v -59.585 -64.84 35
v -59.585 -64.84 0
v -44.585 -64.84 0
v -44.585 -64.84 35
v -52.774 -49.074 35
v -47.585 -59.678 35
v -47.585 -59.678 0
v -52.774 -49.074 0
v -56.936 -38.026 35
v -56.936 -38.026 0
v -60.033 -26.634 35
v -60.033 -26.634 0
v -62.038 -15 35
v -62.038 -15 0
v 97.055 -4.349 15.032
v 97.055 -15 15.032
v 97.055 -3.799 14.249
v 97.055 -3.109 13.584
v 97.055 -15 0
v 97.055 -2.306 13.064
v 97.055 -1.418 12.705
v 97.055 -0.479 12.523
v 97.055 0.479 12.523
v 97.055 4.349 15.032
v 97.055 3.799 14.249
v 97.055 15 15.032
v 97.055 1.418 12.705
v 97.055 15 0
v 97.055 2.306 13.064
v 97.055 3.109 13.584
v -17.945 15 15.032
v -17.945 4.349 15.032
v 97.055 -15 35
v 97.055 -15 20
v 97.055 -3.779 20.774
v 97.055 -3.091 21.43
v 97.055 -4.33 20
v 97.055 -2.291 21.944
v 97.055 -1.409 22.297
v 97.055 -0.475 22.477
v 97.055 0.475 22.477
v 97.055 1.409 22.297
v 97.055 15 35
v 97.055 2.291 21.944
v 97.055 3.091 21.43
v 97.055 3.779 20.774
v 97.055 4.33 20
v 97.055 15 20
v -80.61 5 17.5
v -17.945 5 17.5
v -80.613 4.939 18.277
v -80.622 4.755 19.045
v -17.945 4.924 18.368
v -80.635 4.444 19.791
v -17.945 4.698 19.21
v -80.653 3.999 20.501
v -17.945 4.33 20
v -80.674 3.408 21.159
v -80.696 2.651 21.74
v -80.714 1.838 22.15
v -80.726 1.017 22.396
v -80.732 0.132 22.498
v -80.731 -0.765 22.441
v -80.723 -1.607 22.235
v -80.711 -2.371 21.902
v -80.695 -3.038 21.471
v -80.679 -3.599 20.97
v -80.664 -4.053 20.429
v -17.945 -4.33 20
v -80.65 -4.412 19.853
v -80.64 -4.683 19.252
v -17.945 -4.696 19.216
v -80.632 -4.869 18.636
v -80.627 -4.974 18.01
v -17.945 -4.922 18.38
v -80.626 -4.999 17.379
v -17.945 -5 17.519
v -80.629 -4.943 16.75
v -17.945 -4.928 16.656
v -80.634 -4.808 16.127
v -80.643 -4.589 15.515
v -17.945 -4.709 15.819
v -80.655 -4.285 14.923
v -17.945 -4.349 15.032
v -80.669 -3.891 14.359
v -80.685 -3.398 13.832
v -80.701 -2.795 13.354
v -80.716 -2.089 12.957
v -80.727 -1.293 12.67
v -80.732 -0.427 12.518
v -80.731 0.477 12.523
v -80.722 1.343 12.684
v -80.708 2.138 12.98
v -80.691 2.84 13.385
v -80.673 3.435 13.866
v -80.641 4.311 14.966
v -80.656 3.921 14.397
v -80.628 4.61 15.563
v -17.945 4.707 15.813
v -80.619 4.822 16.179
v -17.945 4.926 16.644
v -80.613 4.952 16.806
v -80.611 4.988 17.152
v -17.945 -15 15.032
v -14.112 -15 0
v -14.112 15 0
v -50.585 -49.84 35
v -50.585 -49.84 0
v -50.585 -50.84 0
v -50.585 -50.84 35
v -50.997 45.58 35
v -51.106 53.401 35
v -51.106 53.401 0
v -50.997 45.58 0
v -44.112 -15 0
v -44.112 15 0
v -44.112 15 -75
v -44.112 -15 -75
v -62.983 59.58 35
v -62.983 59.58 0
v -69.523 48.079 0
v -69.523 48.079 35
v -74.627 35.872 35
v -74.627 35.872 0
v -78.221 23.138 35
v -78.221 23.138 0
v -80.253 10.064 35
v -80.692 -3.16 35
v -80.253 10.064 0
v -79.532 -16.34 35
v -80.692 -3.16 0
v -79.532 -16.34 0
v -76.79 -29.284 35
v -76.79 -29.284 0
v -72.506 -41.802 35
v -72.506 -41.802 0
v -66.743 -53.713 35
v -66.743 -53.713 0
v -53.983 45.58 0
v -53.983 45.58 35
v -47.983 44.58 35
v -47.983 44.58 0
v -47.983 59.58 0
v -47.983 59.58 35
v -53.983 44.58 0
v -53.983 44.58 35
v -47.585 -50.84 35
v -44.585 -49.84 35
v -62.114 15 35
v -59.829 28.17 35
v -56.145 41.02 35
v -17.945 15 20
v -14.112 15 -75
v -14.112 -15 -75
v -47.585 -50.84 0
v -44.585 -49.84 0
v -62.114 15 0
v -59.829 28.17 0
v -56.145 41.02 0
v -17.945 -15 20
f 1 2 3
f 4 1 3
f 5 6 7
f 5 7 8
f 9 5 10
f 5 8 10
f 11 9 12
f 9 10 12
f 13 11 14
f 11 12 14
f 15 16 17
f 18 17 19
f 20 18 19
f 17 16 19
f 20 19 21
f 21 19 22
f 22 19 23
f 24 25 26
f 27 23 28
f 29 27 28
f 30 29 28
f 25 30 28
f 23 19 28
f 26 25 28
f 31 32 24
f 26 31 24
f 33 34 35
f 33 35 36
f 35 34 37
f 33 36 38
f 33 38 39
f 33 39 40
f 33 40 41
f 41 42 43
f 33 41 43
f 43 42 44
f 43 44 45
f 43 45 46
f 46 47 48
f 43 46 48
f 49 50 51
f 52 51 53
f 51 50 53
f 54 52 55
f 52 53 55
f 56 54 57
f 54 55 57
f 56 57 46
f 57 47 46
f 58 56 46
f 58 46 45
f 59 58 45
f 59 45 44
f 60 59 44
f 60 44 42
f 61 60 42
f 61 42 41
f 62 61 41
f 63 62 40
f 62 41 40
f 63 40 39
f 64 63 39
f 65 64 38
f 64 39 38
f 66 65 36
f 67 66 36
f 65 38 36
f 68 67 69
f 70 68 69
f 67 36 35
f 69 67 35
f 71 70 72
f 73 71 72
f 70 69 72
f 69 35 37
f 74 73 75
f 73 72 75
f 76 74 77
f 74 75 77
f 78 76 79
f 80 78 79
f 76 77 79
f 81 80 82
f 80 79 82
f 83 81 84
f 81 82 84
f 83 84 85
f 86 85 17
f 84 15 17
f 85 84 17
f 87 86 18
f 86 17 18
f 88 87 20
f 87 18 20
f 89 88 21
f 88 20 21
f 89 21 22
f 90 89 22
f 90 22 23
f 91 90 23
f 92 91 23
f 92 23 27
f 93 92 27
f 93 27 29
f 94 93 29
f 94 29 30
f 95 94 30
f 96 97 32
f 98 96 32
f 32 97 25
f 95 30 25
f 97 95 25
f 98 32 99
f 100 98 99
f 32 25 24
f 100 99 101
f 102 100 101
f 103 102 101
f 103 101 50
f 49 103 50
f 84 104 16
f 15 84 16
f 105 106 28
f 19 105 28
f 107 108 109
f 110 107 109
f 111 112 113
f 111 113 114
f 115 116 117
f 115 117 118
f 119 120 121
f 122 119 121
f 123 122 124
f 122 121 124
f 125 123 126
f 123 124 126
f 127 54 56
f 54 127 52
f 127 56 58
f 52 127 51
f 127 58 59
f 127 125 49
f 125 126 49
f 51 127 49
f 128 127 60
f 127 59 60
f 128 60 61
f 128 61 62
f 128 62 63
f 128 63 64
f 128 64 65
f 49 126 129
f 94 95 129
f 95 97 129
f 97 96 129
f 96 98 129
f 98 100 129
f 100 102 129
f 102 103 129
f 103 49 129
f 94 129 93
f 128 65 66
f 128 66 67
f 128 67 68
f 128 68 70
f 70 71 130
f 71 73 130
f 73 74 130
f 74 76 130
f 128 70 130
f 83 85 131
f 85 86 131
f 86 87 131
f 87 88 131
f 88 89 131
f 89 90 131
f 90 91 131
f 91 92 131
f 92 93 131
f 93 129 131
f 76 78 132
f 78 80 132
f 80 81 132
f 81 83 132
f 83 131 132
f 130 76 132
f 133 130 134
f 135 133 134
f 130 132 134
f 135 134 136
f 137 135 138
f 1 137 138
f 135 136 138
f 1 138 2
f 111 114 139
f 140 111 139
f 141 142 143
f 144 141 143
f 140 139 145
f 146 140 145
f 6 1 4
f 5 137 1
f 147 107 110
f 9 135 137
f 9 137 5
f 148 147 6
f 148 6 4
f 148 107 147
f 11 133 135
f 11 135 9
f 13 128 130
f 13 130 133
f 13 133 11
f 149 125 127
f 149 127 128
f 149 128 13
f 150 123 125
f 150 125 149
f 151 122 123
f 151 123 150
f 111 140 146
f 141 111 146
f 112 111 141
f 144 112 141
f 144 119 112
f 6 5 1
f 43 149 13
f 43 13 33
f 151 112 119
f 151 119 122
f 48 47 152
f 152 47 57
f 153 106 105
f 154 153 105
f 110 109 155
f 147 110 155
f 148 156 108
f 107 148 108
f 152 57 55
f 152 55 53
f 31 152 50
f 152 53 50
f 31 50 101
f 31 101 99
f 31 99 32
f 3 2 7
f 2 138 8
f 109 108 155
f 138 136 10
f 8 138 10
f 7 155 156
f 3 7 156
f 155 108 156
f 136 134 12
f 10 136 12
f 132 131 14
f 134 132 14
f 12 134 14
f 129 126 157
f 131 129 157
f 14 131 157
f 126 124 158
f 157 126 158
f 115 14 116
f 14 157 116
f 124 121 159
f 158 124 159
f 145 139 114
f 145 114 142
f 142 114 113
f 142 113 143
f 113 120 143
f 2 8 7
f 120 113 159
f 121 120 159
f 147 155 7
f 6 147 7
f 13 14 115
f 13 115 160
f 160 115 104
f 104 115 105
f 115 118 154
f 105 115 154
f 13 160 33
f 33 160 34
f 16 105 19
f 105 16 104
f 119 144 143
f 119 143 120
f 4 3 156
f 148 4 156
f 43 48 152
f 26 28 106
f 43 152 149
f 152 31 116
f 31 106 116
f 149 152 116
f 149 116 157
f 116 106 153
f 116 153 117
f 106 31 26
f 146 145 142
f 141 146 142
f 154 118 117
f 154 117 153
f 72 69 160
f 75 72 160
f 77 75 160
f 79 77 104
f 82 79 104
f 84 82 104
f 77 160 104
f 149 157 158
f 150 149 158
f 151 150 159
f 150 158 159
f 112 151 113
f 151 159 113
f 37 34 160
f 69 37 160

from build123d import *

# Parameters (mm, degrees)
F1_DEPTH = 35
F2_R     = 5
F3_DEPTH = 2000
F5_DEPTH = 70
F6_W     = 30
F6_H     = 30
F7_DEPTH = 75


with BuildPart() as f1:
    # F0 (on Top) → F1 (new body)
    with BuildSketch(Plane.XY):
        with BuildLine():
            Line((-47.982599, 59.580382), (-62.982599, 59.580382))
            ThreePointArc((-62.982599, 59.580382), (-80.691861, -3.159854), (-59.585238, -64.840204))
            Line((-59.585238, -64.840204), (-44.585238, -64.840204))
            Line((-44.585238, -64.840204), (-44.585238, -49.840204))
            Line((-44.585238, -49.840204), (-47.585238, -49.840204))
            Line((-47.585238, -49.840204), (-50.585238, -49.840204))
            Line((-50.585238, -49.840204), (-50.585238, -50.840204))
            Line((-50.585238, -50.840204), (-47.585238, -50.840204))
            Line((-47.585238, -50.840204), (-47.585238, -59.677918))
            ThreePointArc((-47.585238, -59.677918), (-56.935757, -38.026074), (-62.037933, -14.999952))
            Line((-62.037933, -14.999952), (97.05541, -14.999952))
            Line((97.05541, -14.999952), (97.05541, 15.000048))
            Line((97.05541, 15.000048), (-62.114497, 15.000048))
            ThreePointArc((-62.114497, 15.000048), (-58.159644, 34.644429), (-51.106269, 53.40056))
            Line((-51.106269, 53.40056), (-50.99662, 45.580382))
            Line((-50.99662, 45.580382), (-53.982599, 45.580382))
            Line((-53.982599, 45.580382), (-53.982599, 44.580382))
            Line((-53.982599, 44.580382), (-47.982599, 44.580382))
            Line((-47.982599, 44.580382), (-47.982599, 59.580382))
        make_face()
    extrude(amount=F1_DEPTH)

    # F2 (on face) → F3 (cut)
    with BuildSketch(Plane.YZ.offset(97.05541)):
        with Locations((2.4e-05, 17.5)):
            Circle(F2_R)
    extrude(amount=-F3_DEPTH, mode=Mode.SUBTRACT)

    # F4 (on face) → F5 (cut)
    with BuildSketch(Plane.XZ.offset(14.999952)):
        Polygon((-17.94459, 20), (-17.94459, 17.5), (-17.94459, 15.032329), (97.05541, 15.032329), (97.05541, 20), align=None)
    extrude(amount=-F5_DEPTH, mode=Mode.SUBTRACT)

    # F6 (on face) → F7 (join)
    with BuildSketch(Plane(origin=(0, 0, 0), x_dir=(1, 0, 0), z_dir=(0, 0, -1))):
        with Locations((-29.112317, -4.8e-05)):
            Rectangle(F6_W, F6_H)
    extrude(amount=F7_DEPTH)


solid = f1.part
